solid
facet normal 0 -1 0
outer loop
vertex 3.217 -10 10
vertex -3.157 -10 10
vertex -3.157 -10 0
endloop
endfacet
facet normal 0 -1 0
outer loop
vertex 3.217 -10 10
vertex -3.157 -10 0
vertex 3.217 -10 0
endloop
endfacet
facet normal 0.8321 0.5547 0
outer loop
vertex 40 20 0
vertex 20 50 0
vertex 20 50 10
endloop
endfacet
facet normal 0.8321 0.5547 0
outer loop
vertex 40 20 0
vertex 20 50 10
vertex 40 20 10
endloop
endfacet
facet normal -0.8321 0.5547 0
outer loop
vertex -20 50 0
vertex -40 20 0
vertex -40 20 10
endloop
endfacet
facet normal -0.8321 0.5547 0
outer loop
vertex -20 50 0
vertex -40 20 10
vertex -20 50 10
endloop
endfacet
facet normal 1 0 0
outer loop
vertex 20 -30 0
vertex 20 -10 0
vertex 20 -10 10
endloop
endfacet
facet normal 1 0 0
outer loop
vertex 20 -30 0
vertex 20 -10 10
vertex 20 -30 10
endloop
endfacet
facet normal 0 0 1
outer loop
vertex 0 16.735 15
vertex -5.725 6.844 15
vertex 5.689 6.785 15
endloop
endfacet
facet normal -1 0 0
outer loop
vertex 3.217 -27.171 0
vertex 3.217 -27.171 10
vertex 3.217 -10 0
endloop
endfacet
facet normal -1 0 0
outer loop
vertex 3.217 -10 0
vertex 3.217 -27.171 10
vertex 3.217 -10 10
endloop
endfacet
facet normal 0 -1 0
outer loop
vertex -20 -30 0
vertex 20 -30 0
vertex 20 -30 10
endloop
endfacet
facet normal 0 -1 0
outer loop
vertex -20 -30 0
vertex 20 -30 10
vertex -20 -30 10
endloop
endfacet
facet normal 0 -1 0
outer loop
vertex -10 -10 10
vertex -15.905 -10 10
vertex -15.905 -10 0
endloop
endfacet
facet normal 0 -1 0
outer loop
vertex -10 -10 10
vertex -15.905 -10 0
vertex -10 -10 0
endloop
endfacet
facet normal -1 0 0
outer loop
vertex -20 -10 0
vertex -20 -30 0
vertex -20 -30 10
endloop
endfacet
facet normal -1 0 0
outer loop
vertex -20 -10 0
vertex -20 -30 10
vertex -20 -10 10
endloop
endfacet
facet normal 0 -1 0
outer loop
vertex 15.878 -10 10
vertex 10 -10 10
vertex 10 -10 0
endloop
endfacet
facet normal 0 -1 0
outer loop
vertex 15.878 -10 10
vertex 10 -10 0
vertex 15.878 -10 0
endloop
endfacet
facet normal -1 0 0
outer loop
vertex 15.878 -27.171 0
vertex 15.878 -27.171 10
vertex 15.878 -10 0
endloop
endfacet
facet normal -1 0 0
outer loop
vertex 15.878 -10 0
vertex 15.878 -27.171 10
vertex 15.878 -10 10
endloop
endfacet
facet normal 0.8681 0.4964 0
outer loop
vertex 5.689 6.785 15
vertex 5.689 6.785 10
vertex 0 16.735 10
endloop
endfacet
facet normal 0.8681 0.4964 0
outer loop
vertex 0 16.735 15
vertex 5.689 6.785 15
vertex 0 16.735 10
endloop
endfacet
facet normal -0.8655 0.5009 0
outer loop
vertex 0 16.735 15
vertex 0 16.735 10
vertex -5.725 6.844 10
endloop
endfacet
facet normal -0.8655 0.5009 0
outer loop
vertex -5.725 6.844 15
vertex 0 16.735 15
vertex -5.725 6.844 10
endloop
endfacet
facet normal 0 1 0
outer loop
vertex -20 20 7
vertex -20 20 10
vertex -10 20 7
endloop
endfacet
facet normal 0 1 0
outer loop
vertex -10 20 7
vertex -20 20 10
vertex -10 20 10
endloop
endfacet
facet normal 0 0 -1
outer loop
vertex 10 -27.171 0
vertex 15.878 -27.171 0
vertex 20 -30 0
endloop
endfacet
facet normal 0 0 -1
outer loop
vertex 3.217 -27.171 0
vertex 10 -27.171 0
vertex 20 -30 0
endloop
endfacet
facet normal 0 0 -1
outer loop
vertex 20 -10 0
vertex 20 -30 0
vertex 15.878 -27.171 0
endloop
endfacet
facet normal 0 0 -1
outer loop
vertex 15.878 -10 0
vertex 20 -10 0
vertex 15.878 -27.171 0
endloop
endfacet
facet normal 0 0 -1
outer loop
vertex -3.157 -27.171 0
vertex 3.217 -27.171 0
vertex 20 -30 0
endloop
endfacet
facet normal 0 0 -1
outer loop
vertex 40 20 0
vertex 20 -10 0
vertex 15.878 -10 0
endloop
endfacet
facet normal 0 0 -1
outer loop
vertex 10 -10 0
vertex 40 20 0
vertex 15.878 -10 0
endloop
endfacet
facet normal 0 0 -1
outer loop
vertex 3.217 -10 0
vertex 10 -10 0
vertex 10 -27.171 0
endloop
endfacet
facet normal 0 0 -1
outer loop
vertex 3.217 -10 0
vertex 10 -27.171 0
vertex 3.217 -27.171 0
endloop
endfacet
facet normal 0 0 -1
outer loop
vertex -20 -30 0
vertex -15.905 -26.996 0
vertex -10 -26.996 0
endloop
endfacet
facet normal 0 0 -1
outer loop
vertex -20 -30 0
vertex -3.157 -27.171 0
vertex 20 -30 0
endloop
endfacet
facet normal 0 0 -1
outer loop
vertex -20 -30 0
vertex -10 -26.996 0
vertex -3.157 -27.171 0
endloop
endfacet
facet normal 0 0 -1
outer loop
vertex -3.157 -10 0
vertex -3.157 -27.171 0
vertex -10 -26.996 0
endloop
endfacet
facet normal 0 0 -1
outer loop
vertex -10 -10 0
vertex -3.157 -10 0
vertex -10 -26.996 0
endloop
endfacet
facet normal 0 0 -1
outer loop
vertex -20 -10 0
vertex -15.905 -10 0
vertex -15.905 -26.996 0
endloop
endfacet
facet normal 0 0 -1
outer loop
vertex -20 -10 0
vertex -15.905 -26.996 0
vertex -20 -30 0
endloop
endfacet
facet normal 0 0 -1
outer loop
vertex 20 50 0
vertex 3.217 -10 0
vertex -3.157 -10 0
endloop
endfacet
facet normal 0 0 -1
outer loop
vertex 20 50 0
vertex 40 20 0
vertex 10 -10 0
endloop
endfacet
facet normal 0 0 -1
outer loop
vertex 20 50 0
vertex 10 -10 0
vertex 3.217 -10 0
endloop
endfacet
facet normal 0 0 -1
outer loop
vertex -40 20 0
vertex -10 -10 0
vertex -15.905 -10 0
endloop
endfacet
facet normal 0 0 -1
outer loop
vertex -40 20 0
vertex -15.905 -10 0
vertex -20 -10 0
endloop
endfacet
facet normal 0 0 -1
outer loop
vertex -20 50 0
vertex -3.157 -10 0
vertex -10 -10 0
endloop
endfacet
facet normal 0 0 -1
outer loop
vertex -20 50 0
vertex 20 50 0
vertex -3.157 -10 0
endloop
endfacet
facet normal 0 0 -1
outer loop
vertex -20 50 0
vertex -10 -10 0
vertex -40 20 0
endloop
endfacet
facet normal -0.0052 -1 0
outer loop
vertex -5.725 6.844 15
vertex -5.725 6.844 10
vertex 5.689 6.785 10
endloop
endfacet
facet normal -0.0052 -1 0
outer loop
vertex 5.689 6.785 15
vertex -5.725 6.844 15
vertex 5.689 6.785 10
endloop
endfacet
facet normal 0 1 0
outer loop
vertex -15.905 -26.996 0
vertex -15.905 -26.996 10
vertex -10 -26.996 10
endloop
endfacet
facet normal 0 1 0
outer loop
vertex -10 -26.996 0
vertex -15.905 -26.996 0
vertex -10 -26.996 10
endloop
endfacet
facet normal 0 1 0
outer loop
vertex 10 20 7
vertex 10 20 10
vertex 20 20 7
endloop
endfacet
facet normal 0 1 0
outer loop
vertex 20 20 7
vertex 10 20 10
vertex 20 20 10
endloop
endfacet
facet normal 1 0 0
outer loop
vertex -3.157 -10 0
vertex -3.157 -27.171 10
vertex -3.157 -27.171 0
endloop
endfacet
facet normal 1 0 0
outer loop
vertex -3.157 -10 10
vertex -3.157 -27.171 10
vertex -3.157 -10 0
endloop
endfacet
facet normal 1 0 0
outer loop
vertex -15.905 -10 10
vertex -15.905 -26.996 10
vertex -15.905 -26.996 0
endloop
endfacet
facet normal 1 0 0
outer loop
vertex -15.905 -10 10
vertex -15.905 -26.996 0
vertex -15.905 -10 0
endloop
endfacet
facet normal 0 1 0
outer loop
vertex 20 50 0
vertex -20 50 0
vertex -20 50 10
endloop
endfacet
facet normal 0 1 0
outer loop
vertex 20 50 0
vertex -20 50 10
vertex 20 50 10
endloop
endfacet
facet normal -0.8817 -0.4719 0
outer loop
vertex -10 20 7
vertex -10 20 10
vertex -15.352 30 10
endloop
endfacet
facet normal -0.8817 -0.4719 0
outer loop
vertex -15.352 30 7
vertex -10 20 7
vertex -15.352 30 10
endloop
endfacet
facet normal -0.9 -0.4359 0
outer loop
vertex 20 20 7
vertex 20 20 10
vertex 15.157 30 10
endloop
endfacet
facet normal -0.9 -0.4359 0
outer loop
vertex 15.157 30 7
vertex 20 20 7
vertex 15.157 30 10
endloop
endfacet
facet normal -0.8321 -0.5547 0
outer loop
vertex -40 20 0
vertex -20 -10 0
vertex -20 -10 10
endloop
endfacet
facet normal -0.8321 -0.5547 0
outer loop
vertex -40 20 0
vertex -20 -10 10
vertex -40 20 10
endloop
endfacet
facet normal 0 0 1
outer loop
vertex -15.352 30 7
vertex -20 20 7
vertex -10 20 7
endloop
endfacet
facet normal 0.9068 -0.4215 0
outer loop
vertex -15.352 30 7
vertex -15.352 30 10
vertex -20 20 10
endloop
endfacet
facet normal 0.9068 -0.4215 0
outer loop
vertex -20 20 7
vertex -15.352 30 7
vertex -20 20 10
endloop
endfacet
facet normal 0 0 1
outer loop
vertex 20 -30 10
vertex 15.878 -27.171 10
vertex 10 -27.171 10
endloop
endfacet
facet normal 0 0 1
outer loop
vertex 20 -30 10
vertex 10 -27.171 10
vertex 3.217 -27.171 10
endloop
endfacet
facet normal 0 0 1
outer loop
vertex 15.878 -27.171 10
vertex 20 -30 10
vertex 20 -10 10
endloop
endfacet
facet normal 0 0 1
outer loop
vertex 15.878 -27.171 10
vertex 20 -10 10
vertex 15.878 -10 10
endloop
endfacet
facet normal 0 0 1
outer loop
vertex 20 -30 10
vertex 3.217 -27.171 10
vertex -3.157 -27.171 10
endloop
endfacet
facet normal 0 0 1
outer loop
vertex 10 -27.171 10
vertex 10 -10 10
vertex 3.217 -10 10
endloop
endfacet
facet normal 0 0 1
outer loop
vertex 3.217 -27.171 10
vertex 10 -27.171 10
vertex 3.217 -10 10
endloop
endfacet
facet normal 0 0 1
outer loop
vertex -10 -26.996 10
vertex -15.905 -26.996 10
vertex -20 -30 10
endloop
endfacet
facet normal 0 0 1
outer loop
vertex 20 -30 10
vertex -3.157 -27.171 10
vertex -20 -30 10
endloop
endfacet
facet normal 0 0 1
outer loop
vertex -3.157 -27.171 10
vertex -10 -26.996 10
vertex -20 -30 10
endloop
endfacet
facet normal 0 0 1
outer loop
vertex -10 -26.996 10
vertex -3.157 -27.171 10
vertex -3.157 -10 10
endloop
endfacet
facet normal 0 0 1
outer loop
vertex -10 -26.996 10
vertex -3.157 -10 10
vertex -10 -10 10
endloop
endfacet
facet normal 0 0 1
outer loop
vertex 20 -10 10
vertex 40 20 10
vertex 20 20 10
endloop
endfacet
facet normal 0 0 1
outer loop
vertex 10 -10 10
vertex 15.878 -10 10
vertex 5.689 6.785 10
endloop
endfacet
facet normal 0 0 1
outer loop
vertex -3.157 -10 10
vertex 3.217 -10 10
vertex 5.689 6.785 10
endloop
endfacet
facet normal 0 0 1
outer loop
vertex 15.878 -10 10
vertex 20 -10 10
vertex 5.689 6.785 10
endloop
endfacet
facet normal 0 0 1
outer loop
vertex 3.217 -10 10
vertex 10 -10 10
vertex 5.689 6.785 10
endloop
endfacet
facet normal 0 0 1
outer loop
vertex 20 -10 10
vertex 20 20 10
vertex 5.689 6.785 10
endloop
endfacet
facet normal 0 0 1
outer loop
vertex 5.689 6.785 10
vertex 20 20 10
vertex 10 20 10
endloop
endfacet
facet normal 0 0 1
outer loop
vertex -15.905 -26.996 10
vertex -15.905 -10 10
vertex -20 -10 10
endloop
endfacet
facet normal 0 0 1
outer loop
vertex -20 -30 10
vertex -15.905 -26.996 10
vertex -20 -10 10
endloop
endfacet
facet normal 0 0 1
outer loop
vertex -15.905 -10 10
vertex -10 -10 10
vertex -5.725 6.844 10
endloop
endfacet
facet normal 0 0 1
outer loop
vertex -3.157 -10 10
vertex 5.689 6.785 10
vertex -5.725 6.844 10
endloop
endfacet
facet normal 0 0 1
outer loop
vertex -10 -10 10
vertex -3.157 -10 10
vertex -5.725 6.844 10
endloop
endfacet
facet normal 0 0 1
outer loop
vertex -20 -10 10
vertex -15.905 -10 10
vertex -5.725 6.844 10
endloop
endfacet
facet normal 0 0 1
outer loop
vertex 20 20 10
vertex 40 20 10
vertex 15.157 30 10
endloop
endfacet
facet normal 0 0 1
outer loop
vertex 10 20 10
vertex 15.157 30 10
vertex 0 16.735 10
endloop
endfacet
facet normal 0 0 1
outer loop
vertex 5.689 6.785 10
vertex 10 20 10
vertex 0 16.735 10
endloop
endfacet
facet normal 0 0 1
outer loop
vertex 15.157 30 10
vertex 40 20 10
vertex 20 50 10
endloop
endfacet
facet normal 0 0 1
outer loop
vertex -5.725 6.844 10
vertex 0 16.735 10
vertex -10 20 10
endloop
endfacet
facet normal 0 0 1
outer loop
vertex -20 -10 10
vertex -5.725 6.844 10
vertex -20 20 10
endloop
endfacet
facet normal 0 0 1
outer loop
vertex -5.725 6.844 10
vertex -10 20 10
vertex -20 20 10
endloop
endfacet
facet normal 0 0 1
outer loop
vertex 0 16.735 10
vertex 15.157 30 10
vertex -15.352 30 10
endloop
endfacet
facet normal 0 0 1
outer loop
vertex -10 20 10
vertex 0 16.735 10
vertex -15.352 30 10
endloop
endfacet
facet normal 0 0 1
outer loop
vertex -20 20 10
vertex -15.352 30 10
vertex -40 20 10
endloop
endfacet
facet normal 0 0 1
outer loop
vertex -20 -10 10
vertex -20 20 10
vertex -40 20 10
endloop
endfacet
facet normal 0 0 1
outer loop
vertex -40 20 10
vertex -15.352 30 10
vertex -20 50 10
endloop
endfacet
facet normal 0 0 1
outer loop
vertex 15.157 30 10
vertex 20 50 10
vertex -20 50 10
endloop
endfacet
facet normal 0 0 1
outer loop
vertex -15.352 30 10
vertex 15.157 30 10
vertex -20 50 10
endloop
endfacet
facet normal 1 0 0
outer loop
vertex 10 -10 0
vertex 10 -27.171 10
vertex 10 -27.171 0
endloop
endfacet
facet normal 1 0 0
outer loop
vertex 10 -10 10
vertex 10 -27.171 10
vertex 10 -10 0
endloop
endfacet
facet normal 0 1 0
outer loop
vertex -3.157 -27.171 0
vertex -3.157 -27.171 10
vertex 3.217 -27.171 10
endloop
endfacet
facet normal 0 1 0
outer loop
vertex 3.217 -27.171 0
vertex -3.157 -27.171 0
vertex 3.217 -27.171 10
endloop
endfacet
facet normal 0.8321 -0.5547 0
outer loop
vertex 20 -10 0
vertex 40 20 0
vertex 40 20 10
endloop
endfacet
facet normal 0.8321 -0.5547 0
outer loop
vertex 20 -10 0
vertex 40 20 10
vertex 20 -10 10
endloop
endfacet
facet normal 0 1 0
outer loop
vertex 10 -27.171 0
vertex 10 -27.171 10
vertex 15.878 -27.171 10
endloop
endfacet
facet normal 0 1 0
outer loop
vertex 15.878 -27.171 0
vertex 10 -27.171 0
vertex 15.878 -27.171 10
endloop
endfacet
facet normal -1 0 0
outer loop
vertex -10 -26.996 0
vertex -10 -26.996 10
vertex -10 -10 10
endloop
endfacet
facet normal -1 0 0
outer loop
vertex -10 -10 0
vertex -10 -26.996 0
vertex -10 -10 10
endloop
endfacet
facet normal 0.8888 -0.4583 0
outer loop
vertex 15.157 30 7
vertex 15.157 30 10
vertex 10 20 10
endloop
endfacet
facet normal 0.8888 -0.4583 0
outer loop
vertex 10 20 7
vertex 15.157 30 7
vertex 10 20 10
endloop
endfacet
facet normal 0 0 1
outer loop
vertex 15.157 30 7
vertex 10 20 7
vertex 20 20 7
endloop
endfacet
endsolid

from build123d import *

# Parameters (mm, degrees)
PAD_DEPTH       = 10
POCKET_DEPTH    = 3
SKETCH002_W     = 5.905023
SKETCH002_H     = 16.995962
SKETCH002_W_2   = 5.877612
SKETCH002_H_2   = 17.170593
SKETCH002_W_3   = 6.373988
POCKET001_DEPTH = 10.001
PAD001_DEPTH    = 5


with BuildPart() as part:
    # Sketch → Pad (new body)
    with BuildSketch(Plane.XY):
        Polygon((-20, 50), (20, 50), (40, 20), (20, -10), (20, -30), (-20, -30), (-20, -10), (-40, 20), align=None)
    extrude(amount=PAD_DEPTH)

    # Sketch001 (on Face10 of Pad) → Pocket (cut)
    with BuildSketch(Plane.XY.offset(10)):
        Polygon((-15.351509, 30), (-20, 20), (-10, 20), align=None)
        Polygon((10, 20), (20, 20), (15.157187, 30), align=None)
    extrude(amount=-POCKET_DEPTH, mode=Mode.SUBTRACT)

    # Sketch002 (on Face5 of Pocket) → Pocket001 (cut, through all)
    with BuildSketch(Plane.XY.offset(10)):
        with Locations((-12.952511, -18.497981)):
            Rectangle(SKETCH002_W, SKETCH002_H)
        with Locations((12.938806, -18.585296)):
            Rectangle(SKETCH002_W_2, SKETCH002_H_2)
        with Locations((0.029951, -18.585296)):
            Rectangle(SKETCH002_W_3, SKETCH002_H_2)
    extrude(amount=-POCKET001_DEPTH, mode=Mode.SUBTRACT)

    # Sketch003 (on Face5 of Pocket001) → Pad001 (join)
    with BuildSketch(Plane.XY.offset(10)):
        Polygon((0, 16.734911), (-5.724616, 6.843517), (5.68853, 6.784989), align=None)
    extrude(amount=PAD001_DEPTH)


solid = part.part
